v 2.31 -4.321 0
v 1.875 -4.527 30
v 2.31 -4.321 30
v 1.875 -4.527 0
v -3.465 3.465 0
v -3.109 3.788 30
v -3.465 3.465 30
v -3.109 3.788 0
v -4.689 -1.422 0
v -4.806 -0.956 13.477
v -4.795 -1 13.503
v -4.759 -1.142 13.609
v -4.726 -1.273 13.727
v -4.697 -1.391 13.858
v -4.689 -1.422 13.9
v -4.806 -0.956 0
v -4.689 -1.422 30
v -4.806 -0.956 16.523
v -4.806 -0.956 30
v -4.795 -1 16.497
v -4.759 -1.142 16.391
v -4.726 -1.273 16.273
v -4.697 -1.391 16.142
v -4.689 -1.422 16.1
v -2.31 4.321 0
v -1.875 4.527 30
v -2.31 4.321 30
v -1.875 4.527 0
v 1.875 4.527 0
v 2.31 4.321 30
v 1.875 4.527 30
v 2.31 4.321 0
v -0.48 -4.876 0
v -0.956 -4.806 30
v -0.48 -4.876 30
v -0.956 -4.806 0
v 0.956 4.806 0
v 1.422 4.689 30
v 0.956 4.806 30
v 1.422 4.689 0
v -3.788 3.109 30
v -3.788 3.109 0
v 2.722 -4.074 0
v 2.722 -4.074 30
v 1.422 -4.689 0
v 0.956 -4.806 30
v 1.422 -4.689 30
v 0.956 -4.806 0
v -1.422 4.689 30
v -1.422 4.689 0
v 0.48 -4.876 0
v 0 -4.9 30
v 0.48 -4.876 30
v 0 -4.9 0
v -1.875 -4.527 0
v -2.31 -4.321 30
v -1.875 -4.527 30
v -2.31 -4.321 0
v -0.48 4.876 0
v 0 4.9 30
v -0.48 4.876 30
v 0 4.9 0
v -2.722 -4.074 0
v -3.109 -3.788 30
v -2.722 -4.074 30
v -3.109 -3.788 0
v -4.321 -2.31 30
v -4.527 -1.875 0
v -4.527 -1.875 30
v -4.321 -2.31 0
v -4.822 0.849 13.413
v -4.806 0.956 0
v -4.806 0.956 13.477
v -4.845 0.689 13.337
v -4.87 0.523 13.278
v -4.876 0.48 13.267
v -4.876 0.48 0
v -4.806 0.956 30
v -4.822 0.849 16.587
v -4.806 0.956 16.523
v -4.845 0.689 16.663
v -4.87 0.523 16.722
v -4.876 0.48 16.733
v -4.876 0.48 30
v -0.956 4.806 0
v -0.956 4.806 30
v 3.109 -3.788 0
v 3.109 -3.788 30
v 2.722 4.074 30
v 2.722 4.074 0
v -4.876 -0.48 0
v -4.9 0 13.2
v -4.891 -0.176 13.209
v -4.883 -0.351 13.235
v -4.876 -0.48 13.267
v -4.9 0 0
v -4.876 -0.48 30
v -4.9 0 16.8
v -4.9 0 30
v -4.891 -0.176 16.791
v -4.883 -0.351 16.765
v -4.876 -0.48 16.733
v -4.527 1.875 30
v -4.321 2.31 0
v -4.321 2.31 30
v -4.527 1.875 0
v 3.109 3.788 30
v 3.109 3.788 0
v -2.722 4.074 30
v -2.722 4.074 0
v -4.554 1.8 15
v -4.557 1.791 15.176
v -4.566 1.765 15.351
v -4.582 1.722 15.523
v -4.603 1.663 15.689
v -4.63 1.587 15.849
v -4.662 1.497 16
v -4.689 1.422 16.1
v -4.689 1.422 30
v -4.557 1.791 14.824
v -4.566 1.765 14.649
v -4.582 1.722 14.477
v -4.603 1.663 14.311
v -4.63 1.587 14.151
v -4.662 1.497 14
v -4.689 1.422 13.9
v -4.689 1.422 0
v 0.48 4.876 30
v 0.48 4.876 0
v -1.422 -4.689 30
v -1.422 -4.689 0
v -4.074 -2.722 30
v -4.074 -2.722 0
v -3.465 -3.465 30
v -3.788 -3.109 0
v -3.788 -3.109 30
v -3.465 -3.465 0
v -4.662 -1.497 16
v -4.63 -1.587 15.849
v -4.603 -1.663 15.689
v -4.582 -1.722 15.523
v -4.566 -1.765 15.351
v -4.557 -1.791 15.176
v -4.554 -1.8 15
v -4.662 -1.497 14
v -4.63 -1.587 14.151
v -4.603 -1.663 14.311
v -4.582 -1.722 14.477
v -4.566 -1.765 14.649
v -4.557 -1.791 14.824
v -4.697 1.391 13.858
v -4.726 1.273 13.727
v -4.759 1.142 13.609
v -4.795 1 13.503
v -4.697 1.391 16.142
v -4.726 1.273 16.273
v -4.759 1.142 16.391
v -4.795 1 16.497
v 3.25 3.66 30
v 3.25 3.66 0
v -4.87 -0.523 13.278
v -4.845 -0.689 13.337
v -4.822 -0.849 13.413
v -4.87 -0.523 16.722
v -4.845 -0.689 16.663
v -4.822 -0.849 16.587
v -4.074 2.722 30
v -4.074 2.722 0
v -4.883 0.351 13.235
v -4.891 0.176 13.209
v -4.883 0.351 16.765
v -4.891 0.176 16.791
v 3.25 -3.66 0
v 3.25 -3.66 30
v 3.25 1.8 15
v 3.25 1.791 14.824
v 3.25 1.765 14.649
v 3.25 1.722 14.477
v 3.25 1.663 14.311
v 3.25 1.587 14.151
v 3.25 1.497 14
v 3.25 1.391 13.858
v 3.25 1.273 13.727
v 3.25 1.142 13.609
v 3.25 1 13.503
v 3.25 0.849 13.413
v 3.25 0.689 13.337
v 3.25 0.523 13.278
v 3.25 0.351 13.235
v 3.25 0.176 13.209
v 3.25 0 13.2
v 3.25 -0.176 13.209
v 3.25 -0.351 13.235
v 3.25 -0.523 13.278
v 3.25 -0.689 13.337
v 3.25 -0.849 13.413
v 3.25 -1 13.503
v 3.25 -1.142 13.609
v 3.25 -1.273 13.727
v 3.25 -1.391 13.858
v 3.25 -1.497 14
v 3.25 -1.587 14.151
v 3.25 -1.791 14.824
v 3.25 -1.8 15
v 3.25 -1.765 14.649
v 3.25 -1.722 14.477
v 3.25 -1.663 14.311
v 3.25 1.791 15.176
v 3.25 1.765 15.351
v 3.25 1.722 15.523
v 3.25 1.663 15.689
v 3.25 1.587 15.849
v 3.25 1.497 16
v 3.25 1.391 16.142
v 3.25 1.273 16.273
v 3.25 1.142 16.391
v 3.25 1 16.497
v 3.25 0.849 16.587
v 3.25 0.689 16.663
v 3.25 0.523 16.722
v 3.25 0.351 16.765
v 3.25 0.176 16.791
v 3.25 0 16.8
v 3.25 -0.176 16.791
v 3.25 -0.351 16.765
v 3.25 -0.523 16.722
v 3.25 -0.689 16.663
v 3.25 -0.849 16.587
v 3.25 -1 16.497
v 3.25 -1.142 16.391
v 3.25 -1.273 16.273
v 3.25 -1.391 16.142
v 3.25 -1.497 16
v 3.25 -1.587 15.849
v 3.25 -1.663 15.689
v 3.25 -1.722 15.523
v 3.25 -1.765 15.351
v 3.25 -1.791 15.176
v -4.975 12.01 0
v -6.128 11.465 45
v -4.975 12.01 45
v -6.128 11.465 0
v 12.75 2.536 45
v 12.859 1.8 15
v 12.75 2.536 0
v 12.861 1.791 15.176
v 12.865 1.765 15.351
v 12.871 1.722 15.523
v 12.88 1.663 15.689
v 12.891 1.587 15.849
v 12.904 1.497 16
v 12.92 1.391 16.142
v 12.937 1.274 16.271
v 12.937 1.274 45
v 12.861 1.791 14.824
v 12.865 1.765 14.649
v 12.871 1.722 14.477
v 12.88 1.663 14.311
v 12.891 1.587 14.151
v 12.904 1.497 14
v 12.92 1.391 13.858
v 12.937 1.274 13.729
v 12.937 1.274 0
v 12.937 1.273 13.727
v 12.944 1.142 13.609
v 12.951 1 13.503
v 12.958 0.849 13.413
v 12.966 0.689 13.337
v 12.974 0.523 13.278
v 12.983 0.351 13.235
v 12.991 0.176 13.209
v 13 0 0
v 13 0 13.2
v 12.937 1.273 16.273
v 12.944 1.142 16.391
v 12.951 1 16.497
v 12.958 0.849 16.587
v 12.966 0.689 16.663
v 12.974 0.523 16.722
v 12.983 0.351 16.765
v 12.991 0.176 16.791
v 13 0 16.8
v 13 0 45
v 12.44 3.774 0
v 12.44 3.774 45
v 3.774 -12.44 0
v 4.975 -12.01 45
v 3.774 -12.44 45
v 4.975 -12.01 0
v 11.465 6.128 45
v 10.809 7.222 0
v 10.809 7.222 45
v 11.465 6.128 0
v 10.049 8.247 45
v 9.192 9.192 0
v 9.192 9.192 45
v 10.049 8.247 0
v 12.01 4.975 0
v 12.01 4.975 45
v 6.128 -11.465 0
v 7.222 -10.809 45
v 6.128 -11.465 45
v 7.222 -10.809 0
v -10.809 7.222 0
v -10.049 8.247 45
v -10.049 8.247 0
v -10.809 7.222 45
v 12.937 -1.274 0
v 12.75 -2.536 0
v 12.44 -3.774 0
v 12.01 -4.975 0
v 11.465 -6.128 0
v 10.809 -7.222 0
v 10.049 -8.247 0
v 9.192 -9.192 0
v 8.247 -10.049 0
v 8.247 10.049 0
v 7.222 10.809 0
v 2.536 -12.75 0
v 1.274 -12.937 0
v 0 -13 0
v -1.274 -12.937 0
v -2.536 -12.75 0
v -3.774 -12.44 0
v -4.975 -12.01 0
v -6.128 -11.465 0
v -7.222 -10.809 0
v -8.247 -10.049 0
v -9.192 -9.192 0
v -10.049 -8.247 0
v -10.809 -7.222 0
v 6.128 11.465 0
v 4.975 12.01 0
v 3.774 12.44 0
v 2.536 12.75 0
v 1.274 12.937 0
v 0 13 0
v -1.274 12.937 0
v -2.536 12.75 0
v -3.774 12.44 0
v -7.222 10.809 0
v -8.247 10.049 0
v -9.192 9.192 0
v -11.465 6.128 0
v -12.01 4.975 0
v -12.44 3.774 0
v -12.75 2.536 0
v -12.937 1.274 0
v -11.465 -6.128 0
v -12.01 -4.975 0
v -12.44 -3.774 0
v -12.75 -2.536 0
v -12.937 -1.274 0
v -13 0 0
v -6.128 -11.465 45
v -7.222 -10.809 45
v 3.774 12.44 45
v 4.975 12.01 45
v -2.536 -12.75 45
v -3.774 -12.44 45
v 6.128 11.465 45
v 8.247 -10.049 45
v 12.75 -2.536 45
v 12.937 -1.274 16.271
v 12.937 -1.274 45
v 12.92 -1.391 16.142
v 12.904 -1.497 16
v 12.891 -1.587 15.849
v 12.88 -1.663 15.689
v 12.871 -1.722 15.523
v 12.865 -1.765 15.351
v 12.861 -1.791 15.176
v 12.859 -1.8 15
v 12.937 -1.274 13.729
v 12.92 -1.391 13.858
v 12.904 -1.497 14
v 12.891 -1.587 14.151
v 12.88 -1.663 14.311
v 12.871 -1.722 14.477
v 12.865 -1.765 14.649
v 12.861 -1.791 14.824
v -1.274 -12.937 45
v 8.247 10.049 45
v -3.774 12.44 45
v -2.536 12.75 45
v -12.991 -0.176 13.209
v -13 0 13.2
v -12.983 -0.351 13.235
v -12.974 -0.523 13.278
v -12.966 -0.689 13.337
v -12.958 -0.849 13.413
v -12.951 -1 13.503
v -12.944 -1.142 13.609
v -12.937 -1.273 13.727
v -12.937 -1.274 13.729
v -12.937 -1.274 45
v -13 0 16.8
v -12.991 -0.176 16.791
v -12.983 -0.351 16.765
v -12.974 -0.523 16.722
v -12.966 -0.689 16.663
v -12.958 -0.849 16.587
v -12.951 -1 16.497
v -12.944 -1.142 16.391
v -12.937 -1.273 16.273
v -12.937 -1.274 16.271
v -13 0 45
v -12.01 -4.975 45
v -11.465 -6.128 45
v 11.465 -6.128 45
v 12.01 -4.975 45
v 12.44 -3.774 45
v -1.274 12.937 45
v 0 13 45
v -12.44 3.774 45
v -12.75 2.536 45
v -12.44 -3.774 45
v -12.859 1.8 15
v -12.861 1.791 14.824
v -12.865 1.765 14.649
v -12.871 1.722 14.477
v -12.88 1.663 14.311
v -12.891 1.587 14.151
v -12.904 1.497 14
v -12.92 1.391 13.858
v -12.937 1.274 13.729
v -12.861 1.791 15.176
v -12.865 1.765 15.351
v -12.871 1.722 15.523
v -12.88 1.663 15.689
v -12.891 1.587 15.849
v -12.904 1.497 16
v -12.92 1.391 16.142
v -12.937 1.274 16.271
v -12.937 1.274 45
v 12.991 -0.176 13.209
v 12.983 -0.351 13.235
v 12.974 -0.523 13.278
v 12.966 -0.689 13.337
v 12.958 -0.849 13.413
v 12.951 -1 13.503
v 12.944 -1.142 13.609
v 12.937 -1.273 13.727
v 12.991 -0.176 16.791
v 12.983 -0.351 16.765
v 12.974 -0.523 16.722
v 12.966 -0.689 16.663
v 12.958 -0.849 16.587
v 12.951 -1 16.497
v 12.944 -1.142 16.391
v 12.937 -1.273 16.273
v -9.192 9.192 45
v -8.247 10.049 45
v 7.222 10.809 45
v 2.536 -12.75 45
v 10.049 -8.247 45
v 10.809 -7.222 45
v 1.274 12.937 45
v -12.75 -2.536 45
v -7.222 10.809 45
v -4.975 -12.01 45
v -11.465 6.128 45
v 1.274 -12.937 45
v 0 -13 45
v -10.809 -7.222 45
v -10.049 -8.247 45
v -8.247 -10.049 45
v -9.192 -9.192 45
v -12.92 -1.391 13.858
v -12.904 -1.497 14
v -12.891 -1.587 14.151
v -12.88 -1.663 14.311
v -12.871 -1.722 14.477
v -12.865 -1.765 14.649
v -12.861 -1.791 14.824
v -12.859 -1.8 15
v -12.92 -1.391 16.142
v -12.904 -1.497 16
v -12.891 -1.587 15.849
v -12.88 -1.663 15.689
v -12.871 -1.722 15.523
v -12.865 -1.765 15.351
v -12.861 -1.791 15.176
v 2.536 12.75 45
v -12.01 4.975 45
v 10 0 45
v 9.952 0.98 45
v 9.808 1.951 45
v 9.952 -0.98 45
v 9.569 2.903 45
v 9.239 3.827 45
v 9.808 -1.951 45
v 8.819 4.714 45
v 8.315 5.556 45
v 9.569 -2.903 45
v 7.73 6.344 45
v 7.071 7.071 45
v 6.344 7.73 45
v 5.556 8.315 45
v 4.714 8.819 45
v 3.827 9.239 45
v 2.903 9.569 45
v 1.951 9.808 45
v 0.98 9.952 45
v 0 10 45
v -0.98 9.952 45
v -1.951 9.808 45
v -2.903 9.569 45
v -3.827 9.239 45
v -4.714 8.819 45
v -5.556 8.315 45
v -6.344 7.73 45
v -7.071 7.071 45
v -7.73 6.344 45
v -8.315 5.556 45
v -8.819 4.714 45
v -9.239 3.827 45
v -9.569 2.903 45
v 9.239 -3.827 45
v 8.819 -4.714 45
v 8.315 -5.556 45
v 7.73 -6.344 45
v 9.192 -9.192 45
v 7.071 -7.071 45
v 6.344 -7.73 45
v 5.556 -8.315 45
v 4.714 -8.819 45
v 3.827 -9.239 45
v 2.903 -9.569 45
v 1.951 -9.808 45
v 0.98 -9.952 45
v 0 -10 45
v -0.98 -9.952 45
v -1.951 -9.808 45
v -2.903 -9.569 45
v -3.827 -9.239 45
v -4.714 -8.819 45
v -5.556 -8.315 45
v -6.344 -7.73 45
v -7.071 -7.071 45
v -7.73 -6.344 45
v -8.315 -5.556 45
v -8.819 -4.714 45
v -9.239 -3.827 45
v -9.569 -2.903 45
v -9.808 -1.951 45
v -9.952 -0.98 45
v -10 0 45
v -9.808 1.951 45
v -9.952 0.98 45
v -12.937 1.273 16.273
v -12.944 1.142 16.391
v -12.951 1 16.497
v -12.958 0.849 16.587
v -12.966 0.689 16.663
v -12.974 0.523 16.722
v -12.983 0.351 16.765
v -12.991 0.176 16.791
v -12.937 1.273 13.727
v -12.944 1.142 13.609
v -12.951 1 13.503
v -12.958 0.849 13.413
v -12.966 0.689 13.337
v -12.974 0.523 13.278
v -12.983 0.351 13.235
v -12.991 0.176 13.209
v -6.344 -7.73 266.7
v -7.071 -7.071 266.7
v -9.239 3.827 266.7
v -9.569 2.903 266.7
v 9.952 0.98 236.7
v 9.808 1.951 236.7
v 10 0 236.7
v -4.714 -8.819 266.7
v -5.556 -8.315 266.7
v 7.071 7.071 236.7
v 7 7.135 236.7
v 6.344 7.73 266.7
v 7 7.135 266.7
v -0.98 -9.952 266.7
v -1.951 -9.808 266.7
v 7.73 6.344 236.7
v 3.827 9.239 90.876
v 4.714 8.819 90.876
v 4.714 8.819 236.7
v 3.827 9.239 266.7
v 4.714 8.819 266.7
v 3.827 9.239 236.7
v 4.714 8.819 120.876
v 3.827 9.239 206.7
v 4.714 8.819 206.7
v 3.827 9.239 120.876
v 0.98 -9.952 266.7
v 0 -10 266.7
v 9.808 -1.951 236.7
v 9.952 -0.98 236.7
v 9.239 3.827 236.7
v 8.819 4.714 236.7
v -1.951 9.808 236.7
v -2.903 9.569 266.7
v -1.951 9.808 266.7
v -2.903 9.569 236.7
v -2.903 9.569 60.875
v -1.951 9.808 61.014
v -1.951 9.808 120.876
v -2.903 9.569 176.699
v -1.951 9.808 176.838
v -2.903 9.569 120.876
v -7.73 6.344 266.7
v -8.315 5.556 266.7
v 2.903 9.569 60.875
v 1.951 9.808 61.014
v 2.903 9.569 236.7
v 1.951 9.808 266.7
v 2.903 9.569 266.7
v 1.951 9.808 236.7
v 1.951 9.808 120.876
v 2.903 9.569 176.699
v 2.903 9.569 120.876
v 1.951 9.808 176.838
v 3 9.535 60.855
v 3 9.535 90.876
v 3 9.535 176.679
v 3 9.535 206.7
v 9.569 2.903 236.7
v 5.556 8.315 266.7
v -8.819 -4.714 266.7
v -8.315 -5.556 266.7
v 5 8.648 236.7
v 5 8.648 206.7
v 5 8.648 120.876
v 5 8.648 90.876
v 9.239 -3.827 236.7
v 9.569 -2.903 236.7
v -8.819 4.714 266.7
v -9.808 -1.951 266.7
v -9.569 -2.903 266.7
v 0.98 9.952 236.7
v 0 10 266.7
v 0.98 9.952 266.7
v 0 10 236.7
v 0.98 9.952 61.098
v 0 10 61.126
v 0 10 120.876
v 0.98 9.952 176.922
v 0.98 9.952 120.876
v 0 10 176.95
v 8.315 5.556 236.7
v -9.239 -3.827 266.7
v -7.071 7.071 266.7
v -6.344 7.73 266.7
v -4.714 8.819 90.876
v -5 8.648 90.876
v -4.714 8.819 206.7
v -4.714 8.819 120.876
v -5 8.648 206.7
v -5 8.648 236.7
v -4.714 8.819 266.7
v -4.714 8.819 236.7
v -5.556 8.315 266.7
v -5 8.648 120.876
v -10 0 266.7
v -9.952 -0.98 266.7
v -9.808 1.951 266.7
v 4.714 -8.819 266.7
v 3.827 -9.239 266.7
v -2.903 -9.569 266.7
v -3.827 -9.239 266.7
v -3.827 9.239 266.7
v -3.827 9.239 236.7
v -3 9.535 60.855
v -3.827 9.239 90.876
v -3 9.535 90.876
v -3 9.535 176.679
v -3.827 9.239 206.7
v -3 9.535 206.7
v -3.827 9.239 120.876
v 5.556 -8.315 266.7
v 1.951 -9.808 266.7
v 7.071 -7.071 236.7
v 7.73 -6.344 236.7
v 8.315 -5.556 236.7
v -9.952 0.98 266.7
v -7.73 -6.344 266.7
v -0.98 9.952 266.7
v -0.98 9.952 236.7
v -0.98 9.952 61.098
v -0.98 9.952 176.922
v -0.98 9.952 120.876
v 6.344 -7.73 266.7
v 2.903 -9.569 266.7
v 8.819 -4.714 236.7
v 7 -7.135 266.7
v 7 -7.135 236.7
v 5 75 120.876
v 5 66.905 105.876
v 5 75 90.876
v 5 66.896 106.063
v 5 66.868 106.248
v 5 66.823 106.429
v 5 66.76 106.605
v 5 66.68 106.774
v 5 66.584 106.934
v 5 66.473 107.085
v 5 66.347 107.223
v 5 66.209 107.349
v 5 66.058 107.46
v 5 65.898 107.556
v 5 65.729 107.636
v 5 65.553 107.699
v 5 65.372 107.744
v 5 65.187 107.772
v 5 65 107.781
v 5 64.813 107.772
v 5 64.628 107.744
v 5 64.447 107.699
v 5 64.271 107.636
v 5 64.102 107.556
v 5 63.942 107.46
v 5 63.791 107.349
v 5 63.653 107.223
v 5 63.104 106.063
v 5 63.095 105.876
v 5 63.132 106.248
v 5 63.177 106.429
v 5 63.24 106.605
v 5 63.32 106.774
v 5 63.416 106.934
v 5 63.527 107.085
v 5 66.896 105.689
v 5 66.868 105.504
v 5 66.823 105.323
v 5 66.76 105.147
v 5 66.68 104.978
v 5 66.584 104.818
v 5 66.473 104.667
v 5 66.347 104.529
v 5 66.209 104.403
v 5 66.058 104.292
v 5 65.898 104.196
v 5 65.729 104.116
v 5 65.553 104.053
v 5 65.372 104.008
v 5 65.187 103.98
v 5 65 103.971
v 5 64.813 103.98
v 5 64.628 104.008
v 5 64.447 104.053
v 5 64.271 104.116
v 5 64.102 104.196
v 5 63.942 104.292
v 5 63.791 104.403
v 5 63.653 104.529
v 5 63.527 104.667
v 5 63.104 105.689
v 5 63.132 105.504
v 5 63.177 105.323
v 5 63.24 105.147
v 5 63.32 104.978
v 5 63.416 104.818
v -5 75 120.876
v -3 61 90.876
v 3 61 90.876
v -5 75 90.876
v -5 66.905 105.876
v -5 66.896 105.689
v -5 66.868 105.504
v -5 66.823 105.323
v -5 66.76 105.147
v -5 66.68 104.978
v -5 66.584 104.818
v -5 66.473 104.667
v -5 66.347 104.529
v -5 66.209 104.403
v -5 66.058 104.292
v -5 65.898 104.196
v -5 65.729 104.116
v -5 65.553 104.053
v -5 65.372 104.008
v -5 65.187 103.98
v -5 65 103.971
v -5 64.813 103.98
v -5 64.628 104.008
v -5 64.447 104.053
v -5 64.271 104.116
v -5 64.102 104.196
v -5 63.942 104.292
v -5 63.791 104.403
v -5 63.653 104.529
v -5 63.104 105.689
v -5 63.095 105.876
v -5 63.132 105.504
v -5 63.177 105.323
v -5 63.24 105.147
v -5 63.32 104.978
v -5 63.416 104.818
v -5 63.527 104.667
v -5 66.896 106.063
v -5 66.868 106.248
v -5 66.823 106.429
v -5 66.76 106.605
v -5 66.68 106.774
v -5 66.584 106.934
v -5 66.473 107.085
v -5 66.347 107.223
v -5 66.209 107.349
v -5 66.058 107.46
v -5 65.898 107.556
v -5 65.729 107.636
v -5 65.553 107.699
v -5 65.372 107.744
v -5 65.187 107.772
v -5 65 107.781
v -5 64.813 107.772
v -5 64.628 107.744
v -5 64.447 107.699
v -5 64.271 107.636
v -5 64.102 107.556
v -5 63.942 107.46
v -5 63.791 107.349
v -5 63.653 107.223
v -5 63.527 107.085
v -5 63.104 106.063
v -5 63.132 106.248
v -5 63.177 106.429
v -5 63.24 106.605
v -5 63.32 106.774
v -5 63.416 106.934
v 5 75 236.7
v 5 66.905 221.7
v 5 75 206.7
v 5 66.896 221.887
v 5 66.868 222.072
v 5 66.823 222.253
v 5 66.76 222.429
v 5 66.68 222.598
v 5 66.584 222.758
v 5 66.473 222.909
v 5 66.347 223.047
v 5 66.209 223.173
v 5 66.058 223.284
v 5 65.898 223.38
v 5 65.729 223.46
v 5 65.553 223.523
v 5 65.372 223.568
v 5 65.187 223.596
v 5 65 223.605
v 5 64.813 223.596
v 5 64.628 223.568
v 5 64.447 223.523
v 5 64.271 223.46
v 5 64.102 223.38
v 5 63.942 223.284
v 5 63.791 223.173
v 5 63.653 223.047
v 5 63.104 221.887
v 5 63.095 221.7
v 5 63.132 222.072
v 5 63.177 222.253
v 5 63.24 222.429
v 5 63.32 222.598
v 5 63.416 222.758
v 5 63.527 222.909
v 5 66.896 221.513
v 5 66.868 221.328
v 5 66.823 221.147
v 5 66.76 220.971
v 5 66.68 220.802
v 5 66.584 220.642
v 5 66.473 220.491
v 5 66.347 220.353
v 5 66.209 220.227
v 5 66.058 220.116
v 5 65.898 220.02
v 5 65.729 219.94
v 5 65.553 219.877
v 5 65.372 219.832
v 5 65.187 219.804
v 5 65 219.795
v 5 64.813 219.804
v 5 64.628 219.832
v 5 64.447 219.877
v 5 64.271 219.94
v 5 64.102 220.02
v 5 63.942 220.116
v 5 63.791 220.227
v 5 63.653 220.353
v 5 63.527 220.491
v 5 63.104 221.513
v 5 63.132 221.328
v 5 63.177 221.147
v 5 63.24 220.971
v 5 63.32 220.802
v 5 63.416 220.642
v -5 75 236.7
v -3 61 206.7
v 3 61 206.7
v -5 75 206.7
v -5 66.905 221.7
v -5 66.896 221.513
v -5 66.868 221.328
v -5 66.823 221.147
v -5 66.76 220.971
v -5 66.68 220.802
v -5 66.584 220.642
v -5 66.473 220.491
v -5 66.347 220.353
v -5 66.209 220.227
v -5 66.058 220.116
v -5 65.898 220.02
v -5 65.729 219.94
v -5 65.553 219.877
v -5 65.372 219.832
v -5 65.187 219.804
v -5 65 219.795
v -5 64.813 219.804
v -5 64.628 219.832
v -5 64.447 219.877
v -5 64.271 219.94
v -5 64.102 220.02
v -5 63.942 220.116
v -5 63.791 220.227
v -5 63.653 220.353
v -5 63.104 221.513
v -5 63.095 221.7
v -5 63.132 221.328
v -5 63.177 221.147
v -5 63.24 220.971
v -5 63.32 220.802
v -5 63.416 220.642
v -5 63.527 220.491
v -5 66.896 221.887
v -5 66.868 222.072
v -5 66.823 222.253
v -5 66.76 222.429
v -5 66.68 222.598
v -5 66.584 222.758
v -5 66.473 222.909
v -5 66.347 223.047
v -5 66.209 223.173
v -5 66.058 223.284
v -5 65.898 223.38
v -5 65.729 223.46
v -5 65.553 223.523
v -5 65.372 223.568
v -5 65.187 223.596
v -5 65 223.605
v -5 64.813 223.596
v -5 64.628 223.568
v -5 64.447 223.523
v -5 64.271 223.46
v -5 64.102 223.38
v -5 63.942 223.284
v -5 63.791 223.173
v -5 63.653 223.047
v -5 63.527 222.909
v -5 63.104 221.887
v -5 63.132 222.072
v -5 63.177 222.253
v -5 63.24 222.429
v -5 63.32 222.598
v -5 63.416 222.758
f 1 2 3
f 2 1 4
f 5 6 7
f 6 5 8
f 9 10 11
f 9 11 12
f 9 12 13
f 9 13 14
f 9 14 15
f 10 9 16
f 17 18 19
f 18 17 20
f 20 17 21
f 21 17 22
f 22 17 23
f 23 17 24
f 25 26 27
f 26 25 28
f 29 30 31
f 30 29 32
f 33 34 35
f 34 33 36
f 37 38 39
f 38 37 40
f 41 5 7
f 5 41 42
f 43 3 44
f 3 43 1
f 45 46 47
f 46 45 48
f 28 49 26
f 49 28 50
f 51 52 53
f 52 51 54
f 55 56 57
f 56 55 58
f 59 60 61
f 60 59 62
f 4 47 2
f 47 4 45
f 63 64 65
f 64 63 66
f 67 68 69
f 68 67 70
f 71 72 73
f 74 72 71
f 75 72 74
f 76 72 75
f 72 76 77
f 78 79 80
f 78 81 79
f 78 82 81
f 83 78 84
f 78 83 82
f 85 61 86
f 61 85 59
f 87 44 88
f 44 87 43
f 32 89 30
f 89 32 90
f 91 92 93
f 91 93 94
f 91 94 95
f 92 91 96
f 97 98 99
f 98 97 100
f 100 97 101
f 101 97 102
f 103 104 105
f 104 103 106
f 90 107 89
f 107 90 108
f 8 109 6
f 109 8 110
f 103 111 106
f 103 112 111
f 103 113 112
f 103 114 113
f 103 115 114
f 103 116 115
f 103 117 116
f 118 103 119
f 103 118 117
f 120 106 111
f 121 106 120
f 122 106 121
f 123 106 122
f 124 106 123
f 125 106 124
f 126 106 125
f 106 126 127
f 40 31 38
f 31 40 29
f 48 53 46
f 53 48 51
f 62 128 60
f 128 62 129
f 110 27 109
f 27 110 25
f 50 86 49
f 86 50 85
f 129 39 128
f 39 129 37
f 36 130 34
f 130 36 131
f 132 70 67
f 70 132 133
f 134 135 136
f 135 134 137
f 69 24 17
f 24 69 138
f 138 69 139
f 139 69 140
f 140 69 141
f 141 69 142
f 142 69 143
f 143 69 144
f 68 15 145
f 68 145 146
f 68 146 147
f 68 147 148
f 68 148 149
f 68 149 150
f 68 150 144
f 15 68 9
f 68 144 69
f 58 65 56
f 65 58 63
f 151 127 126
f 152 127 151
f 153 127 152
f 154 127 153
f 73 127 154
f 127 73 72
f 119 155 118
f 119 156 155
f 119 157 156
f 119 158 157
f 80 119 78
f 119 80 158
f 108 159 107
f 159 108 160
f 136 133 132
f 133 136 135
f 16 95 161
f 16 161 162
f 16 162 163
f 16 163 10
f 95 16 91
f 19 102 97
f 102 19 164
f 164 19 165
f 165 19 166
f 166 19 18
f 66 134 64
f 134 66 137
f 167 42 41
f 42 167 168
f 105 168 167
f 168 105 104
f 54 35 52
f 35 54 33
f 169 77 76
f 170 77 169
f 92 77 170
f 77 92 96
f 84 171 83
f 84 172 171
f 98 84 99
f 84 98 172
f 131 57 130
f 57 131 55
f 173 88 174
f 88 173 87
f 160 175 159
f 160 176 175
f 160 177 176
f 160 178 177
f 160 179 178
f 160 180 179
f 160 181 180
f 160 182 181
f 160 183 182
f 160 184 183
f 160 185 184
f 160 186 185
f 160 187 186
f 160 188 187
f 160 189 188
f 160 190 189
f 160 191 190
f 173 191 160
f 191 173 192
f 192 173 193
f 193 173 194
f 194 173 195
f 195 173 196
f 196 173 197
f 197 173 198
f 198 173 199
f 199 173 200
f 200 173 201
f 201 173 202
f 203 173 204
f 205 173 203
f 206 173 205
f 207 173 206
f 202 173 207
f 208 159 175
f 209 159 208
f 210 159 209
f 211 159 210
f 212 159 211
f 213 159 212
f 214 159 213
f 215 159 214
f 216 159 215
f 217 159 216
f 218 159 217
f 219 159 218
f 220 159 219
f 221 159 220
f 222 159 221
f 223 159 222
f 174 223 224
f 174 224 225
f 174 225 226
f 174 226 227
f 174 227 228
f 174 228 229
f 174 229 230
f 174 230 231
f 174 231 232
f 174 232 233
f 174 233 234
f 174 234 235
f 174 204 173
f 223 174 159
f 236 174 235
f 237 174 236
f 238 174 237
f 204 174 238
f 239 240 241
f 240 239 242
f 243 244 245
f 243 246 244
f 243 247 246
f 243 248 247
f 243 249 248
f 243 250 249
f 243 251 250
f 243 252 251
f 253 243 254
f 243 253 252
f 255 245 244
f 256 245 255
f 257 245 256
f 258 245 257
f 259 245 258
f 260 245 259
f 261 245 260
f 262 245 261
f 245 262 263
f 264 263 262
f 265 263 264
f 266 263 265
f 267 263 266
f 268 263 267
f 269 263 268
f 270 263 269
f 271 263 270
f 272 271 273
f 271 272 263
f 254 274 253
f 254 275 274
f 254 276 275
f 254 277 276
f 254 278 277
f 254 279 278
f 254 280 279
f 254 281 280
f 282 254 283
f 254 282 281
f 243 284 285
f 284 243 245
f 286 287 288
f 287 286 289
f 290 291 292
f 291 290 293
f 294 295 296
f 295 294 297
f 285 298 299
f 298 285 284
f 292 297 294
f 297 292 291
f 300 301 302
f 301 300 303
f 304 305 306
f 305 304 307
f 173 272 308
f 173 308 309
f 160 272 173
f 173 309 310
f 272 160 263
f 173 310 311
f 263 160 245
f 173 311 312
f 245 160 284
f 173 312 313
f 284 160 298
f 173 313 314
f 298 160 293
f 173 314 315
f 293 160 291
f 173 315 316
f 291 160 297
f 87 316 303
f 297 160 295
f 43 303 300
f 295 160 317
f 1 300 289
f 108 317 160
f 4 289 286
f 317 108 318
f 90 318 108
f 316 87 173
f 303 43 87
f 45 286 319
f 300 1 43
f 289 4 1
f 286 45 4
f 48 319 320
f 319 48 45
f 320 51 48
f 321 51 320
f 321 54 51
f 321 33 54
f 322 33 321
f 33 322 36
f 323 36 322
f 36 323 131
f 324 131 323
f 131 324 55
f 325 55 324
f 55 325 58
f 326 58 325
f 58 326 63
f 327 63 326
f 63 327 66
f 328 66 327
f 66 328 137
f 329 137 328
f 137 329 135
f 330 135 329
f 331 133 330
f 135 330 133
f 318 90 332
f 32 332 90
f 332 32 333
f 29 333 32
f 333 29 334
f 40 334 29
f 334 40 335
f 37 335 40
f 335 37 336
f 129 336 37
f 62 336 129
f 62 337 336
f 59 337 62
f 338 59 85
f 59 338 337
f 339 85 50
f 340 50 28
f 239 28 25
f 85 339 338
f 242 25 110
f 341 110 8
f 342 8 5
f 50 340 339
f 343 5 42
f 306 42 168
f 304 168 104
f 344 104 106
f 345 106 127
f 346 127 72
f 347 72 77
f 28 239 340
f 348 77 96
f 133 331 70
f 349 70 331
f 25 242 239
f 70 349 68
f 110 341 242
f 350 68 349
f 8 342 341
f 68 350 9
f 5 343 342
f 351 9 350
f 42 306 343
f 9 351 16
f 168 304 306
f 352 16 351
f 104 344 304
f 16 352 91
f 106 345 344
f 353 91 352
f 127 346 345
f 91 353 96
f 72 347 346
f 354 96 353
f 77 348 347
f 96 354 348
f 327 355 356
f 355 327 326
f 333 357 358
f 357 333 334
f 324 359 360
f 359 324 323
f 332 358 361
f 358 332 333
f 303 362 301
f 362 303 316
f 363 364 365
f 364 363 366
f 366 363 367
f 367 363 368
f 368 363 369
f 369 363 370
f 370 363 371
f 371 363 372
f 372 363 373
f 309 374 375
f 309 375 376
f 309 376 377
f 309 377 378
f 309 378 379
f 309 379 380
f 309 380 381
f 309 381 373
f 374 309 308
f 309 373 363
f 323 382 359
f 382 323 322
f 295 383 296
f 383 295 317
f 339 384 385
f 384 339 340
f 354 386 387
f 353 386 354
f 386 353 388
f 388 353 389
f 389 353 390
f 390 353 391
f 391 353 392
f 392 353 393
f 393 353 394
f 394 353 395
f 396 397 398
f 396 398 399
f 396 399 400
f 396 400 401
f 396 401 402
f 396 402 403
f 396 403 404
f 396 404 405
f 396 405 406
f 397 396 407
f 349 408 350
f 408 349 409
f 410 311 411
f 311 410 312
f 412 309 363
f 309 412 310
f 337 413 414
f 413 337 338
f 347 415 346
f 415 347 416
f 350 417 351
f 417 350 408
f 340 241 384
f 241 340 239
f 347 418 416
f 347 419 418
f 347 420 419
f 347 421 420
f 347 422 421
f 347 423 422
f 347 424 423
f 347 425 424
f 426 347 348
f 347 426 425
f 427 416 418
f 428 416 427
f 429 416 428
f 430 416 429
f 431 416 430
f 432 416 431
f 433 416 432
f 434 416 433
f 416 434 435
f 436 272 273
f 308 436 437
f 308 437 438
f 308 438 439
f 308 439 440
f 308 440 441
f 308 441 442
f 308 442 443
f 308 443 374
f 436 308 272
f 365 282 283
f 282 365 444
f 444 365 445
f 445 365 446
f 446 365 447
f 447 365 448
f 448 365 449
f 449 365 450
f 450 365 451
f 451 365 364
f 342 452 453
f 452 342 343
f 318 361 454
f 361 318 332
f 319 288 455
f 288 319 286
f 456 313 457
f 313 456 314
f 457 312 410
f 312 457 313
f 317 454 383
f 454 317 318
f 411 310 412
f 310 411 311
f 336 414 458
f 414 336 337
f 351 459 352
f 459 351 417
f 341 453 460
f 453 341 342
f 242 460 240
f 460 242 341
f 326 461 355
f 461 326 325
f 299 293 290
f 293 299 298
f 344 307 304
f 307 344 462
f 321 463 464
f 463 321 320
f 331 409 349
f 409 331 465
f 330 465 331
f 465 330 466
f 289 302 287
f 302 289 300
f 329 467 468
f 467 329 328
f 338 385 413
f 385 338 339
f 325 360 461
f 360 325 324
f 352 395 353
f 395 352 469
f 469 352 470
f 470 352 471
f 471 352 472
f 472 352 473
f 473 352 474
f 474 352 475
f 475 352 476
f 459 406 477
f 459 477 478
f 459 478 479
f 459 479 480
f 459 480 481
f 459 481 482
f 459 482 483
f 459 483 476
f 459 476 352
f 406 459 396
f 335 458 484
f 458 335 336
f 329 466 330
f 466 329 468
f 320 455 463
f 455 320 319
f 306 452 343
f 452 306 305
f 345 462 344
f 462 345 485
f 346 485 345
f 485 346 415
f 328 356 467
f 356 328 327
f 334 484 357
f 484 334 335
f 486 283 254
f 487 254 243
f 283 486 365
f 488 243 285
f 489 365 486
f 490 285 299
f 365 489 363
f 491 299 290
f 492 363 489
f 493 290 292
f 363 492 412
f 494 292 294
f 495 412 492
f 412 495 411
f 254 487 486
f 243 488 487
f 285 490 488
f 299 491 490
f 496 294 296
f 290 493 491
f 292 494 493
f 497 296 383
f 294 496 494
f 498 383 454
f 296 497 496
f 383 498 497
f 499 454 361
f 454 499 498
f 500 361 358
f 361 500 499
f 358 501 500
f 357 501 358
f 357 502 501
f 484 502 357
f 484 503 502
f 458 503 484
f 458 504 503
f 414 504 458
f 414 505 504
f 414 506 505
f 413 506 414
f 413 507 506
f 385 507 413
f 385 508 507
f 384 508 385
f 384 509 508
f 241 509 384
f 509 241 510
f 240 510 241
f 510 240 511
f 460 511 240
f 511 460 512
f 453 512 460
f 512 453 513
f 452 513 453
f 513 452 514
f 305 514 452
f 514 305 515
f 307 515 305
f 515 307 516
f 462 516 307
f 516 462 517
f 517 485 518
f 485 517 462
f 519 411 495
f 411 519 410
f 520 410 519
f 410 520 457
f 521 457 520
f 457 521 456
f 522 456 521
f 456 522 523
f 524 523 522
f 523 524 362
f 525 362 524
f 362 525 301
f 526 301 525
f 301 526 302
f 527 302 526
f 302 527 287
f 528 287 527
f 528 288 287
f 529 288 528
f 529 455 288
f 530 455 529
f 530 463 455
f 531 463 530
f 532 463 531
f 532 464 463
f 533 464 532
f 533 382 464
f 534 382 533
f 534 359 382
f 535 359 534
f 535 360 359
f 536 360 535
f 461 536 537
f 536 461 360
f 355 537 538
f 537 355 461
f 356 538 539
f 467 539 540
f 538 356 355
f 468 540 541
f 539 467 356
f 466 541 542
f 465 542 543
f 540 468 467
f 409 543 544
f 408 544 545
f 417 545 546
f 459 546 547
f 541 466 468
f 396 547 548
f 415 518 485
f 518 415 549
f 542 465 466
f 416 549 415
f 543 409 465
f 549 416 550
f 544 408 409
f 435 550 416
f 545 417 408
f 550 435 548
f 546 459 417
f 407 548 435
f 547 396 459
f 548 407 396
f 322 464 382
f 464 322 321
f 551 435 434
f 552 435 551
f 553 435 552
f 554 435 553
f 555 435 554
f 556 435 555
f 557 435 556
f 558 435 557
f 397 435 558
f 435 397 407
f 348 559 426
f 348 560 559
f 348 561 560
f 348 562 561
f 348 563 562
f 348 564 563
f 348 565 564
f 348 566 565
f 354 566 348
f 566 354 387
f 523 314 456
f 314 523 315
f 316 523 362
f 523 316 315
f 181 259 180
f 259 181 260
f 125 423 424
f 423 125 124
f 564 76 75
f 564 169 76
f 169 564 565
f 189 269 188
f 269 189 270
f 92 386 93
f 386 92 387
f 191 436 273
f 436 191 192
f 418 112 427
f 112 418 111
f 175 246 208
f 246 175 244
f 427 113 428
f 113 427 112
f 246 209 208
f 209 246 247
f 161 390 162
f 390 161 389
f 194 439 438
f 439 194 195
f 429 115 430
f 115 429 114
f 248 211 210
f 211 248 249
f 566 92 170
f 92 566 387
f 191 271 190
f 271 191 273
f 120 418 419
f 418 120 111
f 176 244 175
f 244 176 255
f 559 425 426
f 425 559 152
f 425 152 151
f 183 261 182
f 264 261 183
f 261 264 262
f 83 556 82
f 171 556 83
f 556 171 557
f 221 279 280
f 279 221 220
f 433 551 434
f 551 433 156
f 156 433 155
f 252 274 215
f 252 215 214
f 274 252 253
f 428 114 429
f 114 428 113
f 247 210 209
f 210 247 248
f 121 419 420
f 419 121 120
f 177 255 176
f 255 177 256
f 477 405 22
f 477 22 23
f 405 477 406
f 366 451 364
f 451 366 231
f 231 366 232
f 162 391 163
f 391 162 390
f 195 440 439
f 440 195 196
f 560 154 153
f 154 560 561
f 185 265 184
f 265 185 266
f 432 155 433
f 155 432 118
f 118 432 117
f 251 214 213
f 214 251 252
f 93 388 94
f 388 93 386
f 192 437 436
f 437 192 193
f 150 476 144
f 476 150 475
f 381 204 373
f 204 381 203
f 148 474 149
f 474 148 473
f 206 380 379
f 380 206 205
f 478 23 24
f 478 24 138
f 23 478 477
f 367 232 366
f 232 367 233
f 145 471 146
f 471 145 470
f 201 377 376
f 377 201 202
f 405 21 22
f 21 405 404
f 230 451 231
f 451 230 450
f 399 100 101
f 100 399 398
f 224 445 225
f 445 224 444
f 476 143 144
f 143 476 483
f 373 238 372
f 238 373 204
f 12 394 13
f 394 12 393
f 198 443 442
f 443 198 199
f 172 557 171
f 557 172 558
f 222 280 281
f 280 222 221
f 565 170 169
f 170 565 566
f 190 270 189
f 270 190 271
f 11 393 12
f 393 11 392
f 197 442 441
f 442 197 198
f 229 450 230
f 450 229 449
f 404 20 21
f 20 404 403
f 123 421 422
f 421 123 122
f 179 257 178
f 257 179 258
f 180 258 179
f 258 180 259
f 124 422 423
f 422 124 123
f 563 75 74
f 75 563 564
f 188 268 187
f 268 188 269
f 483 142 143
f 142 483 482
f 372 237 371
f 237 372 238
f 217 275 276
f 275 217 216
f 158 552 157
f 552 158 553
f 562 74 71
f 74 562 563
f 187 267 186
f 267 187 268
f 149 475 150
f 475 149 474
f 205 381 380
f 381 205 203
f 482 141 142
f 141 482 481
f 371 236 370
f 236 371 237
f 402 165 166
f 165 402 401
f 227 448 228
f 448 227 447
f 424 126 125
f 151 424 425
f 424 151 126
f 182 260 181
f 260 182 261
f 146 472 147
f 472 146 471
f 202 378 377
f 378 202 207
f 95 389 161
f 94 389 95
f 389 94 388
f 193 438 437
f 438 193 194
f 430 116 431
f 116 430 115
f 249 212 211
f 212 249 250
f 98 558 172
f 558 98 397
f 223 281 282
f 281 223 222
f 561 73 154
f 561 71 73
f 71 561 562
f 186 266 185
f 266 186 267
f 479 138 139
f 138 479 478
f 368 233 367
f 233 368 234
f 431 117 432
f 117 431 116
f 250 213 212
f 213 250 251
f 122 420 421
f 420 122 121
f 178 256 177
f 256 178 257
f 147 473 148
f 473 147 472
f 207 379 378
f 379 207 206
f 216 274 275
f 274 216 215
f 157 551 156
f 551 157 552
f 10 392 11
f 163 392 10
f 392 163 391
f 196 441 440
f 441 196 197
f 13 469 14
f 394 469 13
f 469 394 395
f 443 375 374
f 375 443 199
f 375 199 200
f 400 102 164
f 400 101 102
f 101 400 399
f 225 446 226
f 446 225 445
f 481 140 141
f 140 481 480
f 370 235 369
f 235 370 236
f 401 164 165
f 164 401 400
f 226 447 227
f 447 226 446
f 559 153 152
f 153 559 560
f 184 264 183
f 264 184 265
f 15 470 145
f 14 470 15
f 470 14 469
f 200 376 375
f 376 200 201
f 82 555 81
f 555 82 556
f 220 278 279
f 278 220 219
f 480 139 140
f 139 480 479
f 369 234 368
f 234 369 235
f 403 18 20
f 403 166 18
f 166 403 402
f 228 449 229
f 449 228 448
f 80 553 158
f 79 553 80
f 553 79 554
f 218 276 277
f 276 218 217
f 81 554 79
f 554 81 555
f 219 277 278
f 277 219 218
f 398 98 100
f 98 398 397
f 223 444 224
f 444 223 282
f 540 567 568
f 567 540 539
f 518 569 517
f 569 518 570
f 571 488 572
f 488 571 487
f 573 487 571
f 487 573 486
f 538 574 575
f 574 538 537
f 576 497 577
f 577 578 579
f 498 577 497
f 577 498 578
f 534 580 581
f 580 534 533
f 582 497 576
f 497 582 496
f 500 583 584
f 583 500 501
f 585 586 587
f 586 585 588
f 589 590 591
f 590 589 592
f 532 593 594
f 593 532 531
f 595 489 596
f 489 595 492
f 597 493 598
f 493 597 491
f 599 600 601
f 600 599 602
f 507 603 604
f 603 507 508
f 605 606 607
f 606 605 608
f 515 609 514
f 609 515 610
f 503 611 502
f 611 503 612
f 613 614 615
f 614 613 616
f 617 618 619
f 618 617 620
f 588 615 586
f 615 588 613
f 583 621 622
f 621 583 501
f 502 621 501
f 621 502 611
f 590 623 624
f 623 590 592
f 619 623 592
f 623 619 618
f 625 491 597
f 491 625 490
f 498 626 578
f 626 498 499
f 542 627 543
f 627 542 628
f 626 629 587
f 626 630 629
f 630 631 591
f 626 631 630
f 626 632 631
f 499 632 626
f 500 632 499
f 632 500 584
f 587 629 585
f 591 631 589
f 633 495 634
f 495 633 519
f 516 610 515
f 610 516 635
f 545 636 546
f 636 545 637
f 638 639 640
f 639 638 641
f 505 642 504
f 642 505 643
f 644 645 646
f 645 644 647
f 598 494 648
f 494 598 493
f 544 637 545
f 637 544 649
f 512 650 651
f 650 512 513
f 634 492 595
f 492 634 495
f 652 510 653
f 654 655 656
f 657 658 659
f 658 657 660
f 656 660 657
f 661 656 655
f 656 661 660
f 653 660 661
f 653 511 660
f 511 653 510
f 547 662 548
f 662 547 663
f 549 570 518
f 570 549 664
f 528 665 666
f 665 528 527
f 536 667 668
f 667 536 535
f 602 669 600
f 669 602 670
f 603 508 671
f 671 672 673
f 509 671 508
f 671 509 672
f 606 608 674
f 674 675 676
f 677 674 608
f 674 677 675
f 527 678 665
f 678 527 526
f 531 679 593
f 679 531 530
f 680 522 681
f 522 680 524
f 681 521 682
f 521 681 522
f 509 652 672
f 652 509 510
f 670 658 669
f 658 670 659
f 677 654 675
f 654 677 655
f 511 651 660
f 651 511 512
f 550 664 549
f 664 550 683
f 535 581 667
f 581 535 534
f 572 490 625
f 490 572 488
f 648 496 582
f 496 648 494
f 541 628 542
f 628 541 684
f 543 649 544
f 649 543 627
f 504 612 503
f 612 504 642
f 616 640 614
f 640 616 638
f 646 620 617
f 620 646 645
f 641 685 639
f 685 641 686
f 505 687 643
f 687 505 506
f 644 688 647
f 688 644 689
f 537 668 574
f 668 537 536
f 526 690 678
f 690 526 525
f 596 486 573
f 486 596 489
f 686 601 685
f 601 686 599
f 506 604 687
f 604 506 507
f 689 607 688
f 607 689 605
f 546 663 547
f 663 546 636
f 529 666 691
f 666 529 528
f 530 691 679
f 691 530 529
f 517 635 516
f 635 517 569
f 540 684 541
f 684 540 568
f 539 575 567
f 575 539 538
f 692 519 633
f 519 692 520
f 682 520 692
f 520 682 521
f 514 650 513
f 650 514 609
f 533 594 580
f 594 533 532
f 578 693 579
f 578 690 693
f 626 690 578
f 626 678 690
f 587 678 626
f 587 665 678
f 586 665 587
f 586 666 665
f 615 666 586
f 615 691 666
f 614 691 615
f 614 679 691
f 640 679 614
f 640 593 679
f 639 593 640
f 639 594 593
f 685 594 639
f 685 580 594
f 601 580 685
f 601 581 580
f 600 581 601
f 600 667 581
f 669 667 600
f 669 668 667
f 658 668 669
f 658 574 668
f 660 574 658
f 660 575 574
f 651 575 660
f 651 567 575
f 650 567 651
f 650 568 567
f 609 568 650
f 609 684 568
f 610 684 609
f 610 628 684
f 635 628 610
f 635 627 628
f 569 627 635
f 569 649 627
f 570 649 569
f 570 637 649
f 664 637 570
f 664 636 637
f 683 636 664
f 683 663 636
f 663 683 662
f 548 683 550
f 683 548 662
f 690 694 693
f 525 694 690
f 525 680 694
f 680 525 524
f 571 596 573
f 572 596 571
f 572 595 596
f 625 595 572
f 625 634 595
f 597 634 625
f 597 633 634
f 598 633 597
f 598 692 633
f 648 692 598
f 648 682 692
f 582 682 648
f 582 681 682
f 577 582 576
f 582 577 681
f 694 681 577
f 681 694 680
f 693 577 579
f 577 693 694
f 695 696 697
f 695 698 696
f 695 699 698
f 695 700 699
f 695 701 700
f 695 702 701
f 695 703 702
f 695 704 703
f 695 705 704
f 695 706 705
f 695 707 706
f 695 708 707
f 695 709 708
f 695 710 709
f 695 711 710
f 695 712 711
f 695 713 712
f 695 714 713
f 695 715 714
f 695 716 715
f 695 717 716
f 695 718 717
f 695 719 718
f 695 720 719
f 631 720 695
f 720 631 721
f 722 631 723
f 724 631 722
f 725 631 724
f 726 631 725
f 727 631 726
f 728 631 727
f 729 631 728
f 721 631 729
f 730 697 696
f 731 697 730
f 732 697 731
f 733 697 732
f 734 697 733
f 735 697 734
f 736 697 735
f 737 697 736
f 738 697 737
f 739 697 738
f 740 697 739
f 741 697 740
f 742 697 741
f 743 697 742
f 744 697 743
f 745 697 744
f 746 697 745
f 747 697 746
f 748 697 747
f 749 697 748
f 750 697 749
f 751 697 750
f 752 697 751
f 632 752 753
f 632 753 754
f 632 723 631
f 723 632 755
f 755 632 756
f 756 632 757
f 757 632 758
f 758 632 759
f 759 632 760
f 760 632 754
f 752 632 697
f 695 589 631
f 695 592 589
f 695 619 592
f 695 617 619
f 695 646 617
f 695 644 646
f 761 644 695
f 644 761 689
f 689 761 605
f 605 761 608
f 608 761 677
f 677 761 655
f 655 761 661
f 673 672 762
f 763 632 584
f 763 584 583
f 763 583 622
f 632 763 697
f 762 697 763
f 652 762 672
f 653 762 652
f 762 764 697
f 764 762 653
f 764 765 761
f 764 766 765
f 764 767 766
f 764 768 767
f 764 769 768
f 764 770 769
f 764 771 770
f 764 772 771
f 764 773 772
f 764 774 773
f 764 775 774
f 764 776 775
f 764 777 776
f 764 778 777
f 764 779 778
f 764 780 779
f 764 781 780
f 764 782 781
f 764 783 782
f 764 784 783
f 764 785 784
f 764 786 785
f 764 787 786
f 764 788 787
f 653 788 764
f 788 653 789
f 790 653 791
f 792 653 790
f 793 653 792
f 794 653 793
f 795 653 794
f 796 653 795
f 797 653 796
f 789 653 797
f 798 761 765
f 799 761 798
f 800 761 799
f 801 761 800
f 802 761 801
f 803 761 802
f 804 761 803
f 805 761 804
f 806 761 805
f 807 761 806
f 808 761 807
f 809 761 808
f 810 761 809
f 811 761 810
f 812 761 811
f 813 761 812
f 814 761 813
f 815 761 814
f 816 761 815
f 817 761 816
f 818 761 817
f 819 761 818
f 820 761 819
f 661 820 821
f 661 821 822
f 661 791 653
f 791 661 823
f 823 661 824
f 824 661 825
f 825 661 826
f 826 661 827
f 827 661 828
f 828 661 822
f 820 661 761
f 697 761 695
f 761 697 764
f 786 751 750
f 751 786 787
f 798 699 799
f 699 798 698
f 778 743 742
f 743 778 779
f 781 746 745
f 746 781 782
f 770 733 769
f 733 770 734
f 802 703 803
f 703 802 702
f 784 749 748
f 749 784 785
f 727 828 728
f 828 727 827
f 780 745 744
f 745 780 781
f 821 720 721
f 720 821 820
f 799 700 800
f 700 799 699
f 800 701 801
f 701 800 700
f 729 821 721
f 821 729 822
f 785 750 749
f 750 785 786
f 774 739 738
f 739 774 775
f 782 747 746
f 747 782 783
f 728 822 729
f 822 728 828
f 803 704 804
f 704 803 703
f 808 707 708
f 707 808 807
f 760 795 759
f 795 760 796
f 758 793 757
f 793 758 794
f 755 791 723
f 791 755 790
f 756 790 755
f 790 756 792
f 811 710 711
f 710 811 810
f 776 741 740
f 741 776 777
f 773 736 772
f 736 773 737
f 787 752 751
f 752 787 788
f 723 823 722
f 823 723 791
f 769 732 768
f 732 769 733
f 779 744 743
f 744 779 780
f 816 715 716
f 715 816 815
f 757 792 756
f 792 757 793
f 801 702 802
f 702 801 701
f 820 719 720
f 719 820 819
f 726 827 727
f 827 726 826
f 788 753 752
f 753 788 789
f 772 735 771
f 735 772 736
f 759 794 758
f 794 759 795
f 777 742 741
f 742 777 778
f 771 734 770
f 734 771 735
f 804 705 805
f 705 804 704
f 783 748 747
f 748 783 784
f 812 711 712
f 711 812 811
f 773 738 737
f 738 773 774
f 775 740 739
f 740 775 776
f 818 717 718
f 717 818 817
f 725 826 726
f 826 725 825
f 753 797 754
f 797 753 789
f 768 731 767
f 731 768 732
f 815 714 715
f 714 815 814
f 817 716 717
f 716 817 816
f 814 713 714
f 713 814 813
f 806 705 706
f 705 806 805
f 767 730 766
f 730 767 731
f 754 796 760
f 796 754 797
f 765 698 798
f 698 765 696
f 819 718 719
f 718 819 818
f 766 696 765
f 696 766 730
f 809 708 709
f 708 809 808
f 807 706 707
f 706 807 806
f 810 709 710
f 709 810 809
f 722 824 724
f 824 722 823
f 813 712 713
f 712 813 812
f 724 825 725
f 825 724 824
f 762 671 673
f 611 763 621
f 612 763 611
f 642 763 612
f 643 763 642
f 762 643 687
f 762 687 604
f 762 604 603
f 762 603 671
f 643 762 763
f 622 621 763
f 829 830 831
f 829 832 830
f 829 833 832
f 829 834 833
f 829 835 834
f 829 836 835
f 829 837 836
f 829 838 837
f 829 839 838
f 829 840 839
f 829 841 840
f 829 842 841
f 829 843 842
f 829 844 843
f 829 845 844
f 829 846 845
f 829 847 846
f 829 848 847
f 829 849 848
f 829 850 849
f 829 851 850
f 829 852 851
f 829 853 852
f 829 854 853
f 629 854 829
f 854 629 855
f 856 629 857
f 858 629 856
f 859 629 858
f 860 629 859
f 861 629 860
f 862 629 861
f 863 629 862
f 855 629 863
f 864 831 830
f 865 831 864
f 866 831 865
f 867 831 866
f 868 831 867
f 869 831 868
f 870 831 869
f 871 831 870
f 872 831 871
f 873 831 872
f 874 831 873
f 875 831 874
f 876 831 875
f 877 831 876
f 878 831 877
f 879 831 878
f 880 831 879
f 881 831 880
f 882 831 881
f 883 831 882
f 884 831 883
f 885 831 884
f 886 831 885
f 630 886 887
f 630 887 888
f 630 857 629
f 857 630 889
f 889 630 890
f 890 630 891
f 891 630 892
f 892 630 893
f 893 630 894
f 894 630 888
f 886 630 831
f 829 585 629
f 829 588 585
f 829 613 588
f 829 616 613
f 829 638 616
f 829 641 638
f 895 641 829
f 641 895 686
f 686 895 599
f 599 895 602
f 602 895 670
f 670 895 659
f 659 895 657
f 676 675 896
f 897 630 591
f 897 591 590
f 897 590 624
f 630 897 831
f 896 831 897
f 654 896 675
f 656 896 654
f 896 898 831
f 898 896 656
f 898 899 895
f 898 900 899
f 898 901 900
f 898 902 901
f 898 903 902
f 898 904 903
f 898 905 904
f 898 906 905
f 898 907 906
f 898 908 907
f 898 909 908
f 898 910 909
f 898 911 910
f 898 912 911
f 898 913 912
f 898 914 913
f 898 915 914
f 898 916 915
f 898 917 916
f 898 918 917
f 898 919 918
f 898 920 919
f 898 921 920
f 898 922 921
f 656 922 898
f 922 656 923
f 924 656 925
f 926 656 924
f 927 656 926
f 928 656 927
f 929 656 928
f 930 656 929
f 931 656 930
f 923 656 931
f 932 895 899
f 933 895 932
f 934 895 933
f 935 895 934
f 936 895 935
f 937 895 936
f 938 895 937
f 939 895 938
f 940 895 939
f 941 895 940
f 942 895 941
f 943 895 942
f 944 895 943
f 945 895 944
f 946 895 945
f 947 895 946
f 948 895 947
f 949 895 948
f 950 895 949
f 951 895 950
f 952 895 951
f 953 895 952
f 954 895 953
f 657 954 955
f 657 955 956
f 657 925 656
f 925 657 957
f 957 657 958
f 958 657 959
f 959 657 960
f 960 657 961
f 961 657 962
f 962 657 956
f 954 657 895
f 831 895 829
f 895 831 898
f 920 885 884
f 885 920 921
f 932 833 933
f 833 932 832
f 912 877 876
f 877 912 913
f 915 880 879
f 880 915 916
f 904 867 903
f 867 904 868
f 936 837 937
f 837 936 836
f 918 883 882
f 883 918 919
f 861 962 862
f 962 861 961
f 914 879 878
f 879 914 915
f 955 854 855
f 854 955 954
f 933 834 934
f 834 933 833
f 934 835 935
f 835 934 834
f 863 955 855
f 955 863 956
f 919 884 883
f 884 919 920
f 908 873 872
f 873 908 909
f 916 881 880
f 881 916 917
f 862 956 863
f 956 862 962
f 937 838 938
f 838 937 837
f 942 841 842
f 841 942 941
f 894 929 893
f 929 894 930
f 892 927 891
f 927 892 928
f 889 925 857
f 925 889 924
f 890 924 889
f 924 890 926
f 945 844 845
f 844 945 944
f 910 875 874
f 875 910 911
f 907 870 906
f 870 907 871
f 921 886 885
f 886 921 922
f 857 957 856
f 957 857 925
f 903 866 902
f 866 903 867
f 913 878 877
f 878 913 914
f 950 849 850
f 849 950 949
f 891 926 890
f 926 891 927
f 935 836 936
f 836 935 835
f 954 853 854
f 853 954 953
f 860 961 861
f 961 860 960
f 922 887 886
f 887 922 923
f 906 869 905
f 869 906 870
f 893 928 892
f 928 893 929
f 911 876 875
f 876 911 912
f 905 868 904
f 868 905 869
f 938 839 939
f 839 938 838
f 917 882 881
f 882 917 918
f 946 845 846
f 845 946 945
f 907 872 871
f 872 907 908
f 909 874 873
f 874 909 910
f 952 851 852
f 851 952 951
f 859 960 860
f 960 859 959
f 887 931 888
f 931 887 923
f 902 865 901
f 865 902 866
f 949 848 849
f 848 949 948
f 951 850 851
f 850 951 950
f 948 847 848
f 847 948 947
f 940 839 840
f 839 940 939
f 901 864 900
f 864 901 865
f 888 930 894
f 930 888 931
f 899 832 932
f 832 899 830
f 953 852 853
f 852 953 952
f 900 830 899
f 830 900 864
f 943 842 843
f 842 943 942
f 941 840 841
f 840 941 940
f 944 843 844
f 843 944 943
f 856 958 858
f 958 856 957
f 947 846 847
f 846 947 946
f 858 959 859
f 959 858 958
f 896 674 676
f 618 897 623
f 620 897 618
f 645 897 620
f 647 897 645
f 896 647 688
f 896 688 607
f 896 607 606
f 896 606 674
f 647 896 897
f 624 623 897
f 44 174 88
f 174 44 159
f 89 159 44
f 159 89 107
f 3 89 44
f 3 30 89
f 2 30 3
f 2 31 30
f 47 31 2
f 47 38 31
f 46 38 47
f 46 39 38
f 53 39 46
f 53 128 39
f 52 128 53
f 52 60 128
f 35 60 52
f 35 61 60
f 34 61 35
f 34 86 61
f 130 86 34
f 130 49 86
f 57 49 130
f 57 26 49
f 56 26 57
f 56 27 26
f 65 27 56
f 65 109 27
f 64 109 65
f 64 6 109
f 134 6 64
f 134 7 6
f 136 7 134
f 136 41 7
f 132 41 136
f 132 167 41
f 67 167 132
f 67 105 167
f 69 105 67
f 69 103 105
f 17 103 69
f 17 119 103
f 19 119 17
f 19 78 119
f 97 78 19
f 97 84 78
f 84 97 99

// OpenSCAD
// FILE: Antenna_Mast_With_Top_Key.scad
// UPDATED: Added a 30mm D-cut at the top to lock the webcam topper.

$fn = 64; 
mm = 25.4; 

// --- SHAFT & ANTENNA SPECS ---
gear_rod_dia  = 9.5;    
d_slice_depth = 1.5;    
socket_depth  = 30;     
antenna_h     = 10.5 * mm; 
hole_spacing  = 4.56 * mm; 
hole_dia      = 0.15 * mm; 

// --- GEOMETRY ---
main_rod_dia           = 20; 
base_reinforcement_dia = 26; 
horizontal_reach       = 65; 
arm_height             = 30; 
arm_width              = 10; 
gusset_thick           = 6; 

// --- NEW: TOP D-CUT SPECS ---
top_dcut_depth = 3;   // Matches the 3mm flat in the webcam topper
top_dcut_h     = 30;  // Length of the flat at the tip

// --- ARM SLIDE ADJUSTMENT ---
arm_slide_down = 45; 

// ============================================================
// RENDER
// ============================================================
union() {
    // 1. REINFORCED D-SOCKET BASE (To Gear Rod)
    difference() {
        color("Gold") cylinder(h = socket_depth + 15, d = base_reinforcement_dia); 
        translate([0, 0, -1]) {
            difference() {
                cylinder(h = socket_depth + 2, d = gear_rod_dia + 0.3);
                translate([gear_rod_dia/2 - d_slice_depth, -gear_rod_dia, 0])
                    cube([gear_rod_dia, gear_rod_dia*2, socket_depth + 5]); 
            }
        }
        translate([0, 0, socket_depth / 2]) rotate([0, 90, 0]) 
            cylinder(h = base_reinforcement_dia + 2, d = 3.6, center=true); 
    }

    // 2. THE MAIN VERTICAL MAST (With Top D-Cut)
    color("Gold") translate([0, 0, socket_depth + 15]) {
        difference() {
            // The Main 20mm Cylinder
            cylinder(h = antenna_h - (socket_depth + 15), d = main_rod_dia); 
            
            // THE TOP D-CUT FLAT
            // Positioned at the very top (antenna_h - socket_depth - 15)
            translate([main_rod_dia/2 - top_dcut_depth, -main_rod_dia, antenna_h - (socket_depth + 15) - top_dcut_h])
                cube([10, main_rod_dia*2, top_dcut_h + 1]);
        }
    }
    
    // Conical transition at base
    color("Gold") translate([0, 0, socket_depth + 15])
        mirror([0,0,1]) cylinder(h=15, d1=base_reinforcement_dia, d2=main_rod_dia); 

    // 3. THE TWO REINFORCED FIN ARMS
    for (z_pos = [antenna_h - hole_spacing - arm_slide_down, antenna_h - arm_slide_down]) { 
        translate([0, 0, z_pos - arm_height/2]) {
            color("Gold") difference() {
                translate([-arm_width/2, 0, 0]) 
                    cube([arm_width, horizontal_reach + 10, arm_height]); 
                translate([-arm_width/2 - 1, horizontal_reach, arm_height/2])
                    rotate([0, 90, 0]) 
                        cylinder(h = arm_width + 2, d = hole_dia); 
            }
            color("Red") 
            translate([-gusset_thick/2, 1, 0]) 
            rotate([90, 0, 90]) 
            linear_extrude(gusset_thick)
            polygon([[0, 0], [0, -35], [horizontal_reach - 5, 0]]); 
        }
    }
}
